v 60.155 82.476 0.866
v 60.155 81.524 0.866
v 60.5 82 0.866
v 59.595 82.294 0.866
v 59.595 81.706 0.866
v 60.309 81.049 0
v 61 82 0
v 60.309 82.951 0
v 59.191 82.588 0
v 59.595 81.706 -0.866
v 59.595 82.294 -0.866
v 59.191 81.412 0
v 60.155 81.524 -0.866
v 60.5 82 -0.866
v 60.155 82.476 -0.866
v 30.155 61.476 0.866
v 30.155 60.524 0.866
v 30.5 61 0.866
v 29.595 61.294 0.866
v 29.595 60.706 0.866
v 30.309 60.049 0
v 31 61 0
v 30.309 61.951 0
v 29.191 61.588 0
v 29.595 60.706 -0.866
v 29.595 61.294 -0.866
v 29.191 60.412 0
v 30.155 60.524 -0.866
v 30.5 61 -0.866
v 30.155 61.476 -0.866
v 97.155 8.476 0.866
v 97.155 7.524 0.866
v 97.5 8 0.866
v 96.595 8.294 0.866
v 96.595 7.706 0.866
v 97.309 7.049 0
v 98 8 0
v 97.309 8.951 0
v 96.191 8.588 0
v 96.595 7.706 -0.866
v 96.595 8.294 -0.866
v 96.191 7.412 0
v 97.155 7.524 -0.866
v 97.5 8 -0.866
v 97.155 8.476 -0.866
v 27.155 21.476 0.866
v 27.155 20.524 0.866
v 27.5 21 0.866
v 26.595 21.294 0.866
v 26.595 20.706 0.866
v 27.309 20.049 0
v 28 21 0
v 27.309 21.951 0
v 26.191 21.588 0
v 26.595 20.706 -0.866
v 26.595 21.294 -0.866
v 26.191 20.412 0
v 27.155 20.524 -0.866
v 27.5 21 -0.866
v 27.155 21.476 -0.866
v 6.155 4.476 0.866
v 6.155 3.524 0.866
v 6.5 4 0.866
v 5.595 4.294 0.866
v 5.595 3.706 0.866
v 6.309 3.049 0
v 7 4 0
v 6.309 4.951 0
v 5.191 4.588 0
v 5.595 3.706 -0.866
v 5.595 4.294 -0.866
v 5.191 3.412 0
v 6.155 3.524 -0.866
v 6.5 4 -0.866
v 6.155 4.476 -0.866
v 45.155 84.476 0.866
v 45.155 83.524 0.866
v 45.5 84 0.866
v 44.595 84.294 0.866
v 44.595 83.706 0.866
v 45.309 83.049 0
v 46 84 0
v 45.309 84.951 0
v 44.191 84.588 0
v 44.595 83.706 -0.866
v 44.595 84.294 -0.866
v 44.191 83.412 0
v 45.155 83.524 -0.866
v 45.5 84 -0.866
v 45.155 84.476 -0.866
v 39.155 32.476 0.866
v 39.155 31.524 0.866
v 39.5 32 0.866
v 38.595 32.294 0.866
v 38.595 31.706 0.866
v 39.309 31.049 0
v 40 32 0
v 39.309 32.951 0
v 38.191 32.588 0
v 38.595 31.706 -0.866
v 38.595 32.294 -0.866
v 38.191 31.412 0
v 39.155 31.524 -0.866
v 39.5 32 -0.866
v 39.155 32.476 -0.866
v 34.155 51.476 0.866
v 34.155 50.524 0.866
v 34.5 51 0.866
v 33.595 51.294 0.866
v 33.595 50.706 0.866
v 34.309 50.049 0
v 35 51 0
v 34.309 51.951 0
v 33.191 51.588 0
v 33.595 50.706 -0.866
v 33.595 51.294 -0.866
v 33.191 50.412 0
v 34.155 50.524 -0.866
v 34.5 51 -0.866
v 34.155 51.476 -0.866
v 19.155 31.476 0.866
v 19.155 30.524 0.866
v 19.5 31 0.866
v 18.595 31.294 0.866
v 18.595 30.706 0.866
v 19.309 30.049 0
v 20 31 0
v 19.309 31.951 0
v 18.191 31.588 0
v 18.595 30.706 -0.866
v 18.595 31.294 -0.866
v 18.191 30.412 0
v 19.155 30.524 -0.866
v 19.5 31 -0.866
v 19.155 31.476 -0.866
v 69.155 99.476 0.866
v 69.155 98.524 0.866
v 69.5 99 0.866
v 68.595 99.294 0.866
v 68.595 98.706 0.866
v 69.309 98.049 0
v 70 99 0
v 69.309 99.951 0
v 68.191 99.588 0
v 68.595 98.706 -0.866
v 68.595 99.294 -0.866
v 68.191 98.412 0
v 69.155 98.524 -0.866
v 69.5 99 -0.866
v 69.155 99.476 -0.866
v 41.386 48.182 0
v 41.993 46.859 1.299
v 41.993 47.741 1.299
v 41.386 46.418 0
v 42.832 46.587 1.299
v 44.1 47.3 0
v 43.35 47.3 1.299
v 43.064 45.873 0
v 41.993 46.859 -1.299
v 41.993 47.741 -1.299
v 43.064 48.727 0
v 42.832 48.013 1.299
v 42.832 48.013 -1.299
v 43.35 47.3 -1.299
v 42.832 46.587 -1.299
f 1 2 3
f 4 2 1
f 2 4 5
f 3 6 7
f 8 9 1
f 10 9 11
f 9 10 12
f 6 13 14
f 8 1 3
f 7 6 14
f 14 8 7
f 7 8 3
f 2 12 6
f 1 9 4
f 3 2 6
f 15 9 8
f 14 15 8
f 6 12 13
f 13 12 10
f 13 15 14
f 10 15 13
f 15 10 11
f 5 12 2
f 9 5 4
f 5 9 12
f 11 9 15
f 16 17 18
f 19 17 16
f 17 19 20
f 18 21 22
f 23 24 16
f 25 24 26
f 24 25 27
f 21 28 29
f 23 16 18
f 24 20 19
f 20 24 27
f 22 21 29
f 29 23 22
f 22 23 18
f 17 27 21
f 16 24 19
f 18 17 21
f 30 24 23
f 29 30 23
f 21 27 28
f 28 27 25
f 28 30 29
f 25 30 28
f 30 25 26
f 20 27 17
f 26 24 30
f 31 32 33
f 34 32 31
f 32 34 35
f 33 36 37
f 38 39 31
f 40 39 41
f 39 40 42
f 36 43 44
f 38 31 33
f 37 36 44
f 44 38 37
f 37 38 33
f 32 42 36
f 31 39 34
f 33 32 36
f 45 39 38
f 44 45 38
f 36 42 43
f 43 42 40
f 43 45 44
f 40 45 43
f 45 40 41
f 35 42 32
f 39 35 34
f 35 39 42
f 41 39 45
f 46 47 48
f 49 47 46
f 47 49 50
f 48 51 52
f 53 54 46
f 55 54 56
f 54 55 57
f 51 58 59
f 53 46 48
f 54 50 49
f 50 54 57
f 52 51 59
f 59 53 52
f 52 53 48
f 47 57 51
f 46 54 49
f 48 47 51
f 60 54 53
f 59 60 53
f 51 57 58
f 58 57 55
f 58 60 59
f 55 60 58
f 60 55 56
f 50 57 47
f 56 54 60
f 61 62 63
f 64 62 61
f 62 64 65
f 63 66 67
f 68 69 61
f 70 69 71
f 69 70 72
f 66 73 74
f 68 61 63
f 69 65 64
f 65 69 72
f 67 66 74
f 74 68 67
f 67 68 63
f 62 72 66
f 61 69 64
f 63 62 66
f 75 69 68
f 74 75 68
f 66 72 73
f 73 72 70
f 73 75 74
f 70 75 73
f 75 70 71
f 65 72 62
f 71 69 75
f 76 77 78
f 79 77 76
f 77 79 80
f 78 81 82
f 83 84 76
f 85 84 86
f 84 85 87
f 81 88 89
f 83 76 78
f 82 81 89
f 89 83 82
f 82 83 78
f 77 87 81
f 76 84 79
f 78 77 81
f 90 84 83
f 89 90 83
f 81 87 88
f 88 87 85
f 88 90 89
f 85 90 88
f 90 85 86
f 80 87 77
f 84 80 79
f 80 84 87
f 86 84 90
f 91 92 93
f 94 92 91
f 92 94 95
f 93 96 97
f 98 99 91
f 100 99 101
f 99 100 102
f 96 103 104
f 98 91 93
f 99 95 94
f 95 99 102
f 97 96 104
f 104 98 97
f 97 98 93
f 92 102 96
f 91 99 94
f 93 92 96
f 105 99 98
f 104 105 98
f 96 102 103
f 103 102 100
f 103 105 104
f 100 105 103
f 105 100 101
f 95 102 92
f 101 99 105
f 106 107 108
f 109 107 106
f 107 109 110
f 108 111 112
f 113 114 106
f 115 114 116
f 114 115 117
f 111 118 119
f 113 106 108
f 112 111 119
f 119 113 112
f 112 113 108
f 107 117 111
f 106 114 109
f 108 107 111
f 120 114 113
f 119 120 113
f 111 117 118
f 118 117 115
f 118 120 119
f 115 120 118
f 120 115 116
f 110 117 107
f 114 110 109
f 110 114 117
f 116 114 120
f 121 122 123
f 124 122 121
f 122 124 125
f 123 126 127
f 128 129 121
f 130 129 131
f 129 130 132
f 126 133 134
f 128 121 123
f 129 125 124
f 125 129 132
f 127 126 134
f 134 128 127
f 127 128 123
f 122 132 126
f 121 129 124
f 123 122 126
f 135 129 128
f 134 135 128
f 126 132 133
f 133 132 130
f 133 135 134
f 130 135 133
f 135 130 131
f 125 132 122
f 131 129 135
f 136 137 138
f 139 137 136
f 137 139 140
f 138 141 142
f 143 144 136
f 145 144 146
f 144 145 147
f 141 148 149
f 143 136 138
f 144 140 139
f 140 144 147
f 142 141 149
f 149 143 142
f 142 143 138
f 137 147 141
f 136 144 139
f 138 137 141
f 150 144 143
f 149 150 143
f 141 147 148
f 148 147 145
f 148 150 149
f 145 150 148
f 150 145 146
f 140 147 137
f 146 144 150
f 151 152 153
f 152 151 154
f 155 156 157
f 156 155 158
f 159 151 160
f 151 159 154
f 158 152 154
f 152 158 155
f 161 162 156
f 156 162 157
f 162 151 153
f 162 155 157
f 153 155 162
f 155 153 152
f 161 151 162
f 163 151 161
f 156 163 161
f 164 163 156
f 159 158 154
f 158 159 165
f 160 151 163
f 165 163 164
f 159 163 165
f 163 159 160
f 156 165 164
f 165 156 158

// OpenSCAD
//arithmetic mean

function rnd_v(init_value,end_value)=round(rands(init_value,end_value,1)[0]);      
      
function rnd_points(width,length,amount)=
     [for(i=[0:amount-1])
        [rnd_v(0,width),rnd_v(0,length)]];
     
array=rnd_points(100,100,10) ;
       
  
for(i=array)
     translate(i)
         sphere(1);

function sum(list)=
      let(leng=len(list))
      leng==1?list[0]:
      leng==2?list[0]+list[1]:
      let( 
          sum_first=list[0]+list[1],
          sum_after=[for(i=[2:leng-1])
              list[i]])    
      sum(concat(sum_first,sum_after));

function arithmetic_mean(array)=
     let(amount=len(array))
     let(x=[for(i=array)
          i.x
          ])
     let(y=[for(i=array)
          i.y
          ]) 
     [sum(x)/amount,sum(y)/amount];
     

translate(arithmetic_mean(array)) 
     color("red")
     sphere(1.5);
